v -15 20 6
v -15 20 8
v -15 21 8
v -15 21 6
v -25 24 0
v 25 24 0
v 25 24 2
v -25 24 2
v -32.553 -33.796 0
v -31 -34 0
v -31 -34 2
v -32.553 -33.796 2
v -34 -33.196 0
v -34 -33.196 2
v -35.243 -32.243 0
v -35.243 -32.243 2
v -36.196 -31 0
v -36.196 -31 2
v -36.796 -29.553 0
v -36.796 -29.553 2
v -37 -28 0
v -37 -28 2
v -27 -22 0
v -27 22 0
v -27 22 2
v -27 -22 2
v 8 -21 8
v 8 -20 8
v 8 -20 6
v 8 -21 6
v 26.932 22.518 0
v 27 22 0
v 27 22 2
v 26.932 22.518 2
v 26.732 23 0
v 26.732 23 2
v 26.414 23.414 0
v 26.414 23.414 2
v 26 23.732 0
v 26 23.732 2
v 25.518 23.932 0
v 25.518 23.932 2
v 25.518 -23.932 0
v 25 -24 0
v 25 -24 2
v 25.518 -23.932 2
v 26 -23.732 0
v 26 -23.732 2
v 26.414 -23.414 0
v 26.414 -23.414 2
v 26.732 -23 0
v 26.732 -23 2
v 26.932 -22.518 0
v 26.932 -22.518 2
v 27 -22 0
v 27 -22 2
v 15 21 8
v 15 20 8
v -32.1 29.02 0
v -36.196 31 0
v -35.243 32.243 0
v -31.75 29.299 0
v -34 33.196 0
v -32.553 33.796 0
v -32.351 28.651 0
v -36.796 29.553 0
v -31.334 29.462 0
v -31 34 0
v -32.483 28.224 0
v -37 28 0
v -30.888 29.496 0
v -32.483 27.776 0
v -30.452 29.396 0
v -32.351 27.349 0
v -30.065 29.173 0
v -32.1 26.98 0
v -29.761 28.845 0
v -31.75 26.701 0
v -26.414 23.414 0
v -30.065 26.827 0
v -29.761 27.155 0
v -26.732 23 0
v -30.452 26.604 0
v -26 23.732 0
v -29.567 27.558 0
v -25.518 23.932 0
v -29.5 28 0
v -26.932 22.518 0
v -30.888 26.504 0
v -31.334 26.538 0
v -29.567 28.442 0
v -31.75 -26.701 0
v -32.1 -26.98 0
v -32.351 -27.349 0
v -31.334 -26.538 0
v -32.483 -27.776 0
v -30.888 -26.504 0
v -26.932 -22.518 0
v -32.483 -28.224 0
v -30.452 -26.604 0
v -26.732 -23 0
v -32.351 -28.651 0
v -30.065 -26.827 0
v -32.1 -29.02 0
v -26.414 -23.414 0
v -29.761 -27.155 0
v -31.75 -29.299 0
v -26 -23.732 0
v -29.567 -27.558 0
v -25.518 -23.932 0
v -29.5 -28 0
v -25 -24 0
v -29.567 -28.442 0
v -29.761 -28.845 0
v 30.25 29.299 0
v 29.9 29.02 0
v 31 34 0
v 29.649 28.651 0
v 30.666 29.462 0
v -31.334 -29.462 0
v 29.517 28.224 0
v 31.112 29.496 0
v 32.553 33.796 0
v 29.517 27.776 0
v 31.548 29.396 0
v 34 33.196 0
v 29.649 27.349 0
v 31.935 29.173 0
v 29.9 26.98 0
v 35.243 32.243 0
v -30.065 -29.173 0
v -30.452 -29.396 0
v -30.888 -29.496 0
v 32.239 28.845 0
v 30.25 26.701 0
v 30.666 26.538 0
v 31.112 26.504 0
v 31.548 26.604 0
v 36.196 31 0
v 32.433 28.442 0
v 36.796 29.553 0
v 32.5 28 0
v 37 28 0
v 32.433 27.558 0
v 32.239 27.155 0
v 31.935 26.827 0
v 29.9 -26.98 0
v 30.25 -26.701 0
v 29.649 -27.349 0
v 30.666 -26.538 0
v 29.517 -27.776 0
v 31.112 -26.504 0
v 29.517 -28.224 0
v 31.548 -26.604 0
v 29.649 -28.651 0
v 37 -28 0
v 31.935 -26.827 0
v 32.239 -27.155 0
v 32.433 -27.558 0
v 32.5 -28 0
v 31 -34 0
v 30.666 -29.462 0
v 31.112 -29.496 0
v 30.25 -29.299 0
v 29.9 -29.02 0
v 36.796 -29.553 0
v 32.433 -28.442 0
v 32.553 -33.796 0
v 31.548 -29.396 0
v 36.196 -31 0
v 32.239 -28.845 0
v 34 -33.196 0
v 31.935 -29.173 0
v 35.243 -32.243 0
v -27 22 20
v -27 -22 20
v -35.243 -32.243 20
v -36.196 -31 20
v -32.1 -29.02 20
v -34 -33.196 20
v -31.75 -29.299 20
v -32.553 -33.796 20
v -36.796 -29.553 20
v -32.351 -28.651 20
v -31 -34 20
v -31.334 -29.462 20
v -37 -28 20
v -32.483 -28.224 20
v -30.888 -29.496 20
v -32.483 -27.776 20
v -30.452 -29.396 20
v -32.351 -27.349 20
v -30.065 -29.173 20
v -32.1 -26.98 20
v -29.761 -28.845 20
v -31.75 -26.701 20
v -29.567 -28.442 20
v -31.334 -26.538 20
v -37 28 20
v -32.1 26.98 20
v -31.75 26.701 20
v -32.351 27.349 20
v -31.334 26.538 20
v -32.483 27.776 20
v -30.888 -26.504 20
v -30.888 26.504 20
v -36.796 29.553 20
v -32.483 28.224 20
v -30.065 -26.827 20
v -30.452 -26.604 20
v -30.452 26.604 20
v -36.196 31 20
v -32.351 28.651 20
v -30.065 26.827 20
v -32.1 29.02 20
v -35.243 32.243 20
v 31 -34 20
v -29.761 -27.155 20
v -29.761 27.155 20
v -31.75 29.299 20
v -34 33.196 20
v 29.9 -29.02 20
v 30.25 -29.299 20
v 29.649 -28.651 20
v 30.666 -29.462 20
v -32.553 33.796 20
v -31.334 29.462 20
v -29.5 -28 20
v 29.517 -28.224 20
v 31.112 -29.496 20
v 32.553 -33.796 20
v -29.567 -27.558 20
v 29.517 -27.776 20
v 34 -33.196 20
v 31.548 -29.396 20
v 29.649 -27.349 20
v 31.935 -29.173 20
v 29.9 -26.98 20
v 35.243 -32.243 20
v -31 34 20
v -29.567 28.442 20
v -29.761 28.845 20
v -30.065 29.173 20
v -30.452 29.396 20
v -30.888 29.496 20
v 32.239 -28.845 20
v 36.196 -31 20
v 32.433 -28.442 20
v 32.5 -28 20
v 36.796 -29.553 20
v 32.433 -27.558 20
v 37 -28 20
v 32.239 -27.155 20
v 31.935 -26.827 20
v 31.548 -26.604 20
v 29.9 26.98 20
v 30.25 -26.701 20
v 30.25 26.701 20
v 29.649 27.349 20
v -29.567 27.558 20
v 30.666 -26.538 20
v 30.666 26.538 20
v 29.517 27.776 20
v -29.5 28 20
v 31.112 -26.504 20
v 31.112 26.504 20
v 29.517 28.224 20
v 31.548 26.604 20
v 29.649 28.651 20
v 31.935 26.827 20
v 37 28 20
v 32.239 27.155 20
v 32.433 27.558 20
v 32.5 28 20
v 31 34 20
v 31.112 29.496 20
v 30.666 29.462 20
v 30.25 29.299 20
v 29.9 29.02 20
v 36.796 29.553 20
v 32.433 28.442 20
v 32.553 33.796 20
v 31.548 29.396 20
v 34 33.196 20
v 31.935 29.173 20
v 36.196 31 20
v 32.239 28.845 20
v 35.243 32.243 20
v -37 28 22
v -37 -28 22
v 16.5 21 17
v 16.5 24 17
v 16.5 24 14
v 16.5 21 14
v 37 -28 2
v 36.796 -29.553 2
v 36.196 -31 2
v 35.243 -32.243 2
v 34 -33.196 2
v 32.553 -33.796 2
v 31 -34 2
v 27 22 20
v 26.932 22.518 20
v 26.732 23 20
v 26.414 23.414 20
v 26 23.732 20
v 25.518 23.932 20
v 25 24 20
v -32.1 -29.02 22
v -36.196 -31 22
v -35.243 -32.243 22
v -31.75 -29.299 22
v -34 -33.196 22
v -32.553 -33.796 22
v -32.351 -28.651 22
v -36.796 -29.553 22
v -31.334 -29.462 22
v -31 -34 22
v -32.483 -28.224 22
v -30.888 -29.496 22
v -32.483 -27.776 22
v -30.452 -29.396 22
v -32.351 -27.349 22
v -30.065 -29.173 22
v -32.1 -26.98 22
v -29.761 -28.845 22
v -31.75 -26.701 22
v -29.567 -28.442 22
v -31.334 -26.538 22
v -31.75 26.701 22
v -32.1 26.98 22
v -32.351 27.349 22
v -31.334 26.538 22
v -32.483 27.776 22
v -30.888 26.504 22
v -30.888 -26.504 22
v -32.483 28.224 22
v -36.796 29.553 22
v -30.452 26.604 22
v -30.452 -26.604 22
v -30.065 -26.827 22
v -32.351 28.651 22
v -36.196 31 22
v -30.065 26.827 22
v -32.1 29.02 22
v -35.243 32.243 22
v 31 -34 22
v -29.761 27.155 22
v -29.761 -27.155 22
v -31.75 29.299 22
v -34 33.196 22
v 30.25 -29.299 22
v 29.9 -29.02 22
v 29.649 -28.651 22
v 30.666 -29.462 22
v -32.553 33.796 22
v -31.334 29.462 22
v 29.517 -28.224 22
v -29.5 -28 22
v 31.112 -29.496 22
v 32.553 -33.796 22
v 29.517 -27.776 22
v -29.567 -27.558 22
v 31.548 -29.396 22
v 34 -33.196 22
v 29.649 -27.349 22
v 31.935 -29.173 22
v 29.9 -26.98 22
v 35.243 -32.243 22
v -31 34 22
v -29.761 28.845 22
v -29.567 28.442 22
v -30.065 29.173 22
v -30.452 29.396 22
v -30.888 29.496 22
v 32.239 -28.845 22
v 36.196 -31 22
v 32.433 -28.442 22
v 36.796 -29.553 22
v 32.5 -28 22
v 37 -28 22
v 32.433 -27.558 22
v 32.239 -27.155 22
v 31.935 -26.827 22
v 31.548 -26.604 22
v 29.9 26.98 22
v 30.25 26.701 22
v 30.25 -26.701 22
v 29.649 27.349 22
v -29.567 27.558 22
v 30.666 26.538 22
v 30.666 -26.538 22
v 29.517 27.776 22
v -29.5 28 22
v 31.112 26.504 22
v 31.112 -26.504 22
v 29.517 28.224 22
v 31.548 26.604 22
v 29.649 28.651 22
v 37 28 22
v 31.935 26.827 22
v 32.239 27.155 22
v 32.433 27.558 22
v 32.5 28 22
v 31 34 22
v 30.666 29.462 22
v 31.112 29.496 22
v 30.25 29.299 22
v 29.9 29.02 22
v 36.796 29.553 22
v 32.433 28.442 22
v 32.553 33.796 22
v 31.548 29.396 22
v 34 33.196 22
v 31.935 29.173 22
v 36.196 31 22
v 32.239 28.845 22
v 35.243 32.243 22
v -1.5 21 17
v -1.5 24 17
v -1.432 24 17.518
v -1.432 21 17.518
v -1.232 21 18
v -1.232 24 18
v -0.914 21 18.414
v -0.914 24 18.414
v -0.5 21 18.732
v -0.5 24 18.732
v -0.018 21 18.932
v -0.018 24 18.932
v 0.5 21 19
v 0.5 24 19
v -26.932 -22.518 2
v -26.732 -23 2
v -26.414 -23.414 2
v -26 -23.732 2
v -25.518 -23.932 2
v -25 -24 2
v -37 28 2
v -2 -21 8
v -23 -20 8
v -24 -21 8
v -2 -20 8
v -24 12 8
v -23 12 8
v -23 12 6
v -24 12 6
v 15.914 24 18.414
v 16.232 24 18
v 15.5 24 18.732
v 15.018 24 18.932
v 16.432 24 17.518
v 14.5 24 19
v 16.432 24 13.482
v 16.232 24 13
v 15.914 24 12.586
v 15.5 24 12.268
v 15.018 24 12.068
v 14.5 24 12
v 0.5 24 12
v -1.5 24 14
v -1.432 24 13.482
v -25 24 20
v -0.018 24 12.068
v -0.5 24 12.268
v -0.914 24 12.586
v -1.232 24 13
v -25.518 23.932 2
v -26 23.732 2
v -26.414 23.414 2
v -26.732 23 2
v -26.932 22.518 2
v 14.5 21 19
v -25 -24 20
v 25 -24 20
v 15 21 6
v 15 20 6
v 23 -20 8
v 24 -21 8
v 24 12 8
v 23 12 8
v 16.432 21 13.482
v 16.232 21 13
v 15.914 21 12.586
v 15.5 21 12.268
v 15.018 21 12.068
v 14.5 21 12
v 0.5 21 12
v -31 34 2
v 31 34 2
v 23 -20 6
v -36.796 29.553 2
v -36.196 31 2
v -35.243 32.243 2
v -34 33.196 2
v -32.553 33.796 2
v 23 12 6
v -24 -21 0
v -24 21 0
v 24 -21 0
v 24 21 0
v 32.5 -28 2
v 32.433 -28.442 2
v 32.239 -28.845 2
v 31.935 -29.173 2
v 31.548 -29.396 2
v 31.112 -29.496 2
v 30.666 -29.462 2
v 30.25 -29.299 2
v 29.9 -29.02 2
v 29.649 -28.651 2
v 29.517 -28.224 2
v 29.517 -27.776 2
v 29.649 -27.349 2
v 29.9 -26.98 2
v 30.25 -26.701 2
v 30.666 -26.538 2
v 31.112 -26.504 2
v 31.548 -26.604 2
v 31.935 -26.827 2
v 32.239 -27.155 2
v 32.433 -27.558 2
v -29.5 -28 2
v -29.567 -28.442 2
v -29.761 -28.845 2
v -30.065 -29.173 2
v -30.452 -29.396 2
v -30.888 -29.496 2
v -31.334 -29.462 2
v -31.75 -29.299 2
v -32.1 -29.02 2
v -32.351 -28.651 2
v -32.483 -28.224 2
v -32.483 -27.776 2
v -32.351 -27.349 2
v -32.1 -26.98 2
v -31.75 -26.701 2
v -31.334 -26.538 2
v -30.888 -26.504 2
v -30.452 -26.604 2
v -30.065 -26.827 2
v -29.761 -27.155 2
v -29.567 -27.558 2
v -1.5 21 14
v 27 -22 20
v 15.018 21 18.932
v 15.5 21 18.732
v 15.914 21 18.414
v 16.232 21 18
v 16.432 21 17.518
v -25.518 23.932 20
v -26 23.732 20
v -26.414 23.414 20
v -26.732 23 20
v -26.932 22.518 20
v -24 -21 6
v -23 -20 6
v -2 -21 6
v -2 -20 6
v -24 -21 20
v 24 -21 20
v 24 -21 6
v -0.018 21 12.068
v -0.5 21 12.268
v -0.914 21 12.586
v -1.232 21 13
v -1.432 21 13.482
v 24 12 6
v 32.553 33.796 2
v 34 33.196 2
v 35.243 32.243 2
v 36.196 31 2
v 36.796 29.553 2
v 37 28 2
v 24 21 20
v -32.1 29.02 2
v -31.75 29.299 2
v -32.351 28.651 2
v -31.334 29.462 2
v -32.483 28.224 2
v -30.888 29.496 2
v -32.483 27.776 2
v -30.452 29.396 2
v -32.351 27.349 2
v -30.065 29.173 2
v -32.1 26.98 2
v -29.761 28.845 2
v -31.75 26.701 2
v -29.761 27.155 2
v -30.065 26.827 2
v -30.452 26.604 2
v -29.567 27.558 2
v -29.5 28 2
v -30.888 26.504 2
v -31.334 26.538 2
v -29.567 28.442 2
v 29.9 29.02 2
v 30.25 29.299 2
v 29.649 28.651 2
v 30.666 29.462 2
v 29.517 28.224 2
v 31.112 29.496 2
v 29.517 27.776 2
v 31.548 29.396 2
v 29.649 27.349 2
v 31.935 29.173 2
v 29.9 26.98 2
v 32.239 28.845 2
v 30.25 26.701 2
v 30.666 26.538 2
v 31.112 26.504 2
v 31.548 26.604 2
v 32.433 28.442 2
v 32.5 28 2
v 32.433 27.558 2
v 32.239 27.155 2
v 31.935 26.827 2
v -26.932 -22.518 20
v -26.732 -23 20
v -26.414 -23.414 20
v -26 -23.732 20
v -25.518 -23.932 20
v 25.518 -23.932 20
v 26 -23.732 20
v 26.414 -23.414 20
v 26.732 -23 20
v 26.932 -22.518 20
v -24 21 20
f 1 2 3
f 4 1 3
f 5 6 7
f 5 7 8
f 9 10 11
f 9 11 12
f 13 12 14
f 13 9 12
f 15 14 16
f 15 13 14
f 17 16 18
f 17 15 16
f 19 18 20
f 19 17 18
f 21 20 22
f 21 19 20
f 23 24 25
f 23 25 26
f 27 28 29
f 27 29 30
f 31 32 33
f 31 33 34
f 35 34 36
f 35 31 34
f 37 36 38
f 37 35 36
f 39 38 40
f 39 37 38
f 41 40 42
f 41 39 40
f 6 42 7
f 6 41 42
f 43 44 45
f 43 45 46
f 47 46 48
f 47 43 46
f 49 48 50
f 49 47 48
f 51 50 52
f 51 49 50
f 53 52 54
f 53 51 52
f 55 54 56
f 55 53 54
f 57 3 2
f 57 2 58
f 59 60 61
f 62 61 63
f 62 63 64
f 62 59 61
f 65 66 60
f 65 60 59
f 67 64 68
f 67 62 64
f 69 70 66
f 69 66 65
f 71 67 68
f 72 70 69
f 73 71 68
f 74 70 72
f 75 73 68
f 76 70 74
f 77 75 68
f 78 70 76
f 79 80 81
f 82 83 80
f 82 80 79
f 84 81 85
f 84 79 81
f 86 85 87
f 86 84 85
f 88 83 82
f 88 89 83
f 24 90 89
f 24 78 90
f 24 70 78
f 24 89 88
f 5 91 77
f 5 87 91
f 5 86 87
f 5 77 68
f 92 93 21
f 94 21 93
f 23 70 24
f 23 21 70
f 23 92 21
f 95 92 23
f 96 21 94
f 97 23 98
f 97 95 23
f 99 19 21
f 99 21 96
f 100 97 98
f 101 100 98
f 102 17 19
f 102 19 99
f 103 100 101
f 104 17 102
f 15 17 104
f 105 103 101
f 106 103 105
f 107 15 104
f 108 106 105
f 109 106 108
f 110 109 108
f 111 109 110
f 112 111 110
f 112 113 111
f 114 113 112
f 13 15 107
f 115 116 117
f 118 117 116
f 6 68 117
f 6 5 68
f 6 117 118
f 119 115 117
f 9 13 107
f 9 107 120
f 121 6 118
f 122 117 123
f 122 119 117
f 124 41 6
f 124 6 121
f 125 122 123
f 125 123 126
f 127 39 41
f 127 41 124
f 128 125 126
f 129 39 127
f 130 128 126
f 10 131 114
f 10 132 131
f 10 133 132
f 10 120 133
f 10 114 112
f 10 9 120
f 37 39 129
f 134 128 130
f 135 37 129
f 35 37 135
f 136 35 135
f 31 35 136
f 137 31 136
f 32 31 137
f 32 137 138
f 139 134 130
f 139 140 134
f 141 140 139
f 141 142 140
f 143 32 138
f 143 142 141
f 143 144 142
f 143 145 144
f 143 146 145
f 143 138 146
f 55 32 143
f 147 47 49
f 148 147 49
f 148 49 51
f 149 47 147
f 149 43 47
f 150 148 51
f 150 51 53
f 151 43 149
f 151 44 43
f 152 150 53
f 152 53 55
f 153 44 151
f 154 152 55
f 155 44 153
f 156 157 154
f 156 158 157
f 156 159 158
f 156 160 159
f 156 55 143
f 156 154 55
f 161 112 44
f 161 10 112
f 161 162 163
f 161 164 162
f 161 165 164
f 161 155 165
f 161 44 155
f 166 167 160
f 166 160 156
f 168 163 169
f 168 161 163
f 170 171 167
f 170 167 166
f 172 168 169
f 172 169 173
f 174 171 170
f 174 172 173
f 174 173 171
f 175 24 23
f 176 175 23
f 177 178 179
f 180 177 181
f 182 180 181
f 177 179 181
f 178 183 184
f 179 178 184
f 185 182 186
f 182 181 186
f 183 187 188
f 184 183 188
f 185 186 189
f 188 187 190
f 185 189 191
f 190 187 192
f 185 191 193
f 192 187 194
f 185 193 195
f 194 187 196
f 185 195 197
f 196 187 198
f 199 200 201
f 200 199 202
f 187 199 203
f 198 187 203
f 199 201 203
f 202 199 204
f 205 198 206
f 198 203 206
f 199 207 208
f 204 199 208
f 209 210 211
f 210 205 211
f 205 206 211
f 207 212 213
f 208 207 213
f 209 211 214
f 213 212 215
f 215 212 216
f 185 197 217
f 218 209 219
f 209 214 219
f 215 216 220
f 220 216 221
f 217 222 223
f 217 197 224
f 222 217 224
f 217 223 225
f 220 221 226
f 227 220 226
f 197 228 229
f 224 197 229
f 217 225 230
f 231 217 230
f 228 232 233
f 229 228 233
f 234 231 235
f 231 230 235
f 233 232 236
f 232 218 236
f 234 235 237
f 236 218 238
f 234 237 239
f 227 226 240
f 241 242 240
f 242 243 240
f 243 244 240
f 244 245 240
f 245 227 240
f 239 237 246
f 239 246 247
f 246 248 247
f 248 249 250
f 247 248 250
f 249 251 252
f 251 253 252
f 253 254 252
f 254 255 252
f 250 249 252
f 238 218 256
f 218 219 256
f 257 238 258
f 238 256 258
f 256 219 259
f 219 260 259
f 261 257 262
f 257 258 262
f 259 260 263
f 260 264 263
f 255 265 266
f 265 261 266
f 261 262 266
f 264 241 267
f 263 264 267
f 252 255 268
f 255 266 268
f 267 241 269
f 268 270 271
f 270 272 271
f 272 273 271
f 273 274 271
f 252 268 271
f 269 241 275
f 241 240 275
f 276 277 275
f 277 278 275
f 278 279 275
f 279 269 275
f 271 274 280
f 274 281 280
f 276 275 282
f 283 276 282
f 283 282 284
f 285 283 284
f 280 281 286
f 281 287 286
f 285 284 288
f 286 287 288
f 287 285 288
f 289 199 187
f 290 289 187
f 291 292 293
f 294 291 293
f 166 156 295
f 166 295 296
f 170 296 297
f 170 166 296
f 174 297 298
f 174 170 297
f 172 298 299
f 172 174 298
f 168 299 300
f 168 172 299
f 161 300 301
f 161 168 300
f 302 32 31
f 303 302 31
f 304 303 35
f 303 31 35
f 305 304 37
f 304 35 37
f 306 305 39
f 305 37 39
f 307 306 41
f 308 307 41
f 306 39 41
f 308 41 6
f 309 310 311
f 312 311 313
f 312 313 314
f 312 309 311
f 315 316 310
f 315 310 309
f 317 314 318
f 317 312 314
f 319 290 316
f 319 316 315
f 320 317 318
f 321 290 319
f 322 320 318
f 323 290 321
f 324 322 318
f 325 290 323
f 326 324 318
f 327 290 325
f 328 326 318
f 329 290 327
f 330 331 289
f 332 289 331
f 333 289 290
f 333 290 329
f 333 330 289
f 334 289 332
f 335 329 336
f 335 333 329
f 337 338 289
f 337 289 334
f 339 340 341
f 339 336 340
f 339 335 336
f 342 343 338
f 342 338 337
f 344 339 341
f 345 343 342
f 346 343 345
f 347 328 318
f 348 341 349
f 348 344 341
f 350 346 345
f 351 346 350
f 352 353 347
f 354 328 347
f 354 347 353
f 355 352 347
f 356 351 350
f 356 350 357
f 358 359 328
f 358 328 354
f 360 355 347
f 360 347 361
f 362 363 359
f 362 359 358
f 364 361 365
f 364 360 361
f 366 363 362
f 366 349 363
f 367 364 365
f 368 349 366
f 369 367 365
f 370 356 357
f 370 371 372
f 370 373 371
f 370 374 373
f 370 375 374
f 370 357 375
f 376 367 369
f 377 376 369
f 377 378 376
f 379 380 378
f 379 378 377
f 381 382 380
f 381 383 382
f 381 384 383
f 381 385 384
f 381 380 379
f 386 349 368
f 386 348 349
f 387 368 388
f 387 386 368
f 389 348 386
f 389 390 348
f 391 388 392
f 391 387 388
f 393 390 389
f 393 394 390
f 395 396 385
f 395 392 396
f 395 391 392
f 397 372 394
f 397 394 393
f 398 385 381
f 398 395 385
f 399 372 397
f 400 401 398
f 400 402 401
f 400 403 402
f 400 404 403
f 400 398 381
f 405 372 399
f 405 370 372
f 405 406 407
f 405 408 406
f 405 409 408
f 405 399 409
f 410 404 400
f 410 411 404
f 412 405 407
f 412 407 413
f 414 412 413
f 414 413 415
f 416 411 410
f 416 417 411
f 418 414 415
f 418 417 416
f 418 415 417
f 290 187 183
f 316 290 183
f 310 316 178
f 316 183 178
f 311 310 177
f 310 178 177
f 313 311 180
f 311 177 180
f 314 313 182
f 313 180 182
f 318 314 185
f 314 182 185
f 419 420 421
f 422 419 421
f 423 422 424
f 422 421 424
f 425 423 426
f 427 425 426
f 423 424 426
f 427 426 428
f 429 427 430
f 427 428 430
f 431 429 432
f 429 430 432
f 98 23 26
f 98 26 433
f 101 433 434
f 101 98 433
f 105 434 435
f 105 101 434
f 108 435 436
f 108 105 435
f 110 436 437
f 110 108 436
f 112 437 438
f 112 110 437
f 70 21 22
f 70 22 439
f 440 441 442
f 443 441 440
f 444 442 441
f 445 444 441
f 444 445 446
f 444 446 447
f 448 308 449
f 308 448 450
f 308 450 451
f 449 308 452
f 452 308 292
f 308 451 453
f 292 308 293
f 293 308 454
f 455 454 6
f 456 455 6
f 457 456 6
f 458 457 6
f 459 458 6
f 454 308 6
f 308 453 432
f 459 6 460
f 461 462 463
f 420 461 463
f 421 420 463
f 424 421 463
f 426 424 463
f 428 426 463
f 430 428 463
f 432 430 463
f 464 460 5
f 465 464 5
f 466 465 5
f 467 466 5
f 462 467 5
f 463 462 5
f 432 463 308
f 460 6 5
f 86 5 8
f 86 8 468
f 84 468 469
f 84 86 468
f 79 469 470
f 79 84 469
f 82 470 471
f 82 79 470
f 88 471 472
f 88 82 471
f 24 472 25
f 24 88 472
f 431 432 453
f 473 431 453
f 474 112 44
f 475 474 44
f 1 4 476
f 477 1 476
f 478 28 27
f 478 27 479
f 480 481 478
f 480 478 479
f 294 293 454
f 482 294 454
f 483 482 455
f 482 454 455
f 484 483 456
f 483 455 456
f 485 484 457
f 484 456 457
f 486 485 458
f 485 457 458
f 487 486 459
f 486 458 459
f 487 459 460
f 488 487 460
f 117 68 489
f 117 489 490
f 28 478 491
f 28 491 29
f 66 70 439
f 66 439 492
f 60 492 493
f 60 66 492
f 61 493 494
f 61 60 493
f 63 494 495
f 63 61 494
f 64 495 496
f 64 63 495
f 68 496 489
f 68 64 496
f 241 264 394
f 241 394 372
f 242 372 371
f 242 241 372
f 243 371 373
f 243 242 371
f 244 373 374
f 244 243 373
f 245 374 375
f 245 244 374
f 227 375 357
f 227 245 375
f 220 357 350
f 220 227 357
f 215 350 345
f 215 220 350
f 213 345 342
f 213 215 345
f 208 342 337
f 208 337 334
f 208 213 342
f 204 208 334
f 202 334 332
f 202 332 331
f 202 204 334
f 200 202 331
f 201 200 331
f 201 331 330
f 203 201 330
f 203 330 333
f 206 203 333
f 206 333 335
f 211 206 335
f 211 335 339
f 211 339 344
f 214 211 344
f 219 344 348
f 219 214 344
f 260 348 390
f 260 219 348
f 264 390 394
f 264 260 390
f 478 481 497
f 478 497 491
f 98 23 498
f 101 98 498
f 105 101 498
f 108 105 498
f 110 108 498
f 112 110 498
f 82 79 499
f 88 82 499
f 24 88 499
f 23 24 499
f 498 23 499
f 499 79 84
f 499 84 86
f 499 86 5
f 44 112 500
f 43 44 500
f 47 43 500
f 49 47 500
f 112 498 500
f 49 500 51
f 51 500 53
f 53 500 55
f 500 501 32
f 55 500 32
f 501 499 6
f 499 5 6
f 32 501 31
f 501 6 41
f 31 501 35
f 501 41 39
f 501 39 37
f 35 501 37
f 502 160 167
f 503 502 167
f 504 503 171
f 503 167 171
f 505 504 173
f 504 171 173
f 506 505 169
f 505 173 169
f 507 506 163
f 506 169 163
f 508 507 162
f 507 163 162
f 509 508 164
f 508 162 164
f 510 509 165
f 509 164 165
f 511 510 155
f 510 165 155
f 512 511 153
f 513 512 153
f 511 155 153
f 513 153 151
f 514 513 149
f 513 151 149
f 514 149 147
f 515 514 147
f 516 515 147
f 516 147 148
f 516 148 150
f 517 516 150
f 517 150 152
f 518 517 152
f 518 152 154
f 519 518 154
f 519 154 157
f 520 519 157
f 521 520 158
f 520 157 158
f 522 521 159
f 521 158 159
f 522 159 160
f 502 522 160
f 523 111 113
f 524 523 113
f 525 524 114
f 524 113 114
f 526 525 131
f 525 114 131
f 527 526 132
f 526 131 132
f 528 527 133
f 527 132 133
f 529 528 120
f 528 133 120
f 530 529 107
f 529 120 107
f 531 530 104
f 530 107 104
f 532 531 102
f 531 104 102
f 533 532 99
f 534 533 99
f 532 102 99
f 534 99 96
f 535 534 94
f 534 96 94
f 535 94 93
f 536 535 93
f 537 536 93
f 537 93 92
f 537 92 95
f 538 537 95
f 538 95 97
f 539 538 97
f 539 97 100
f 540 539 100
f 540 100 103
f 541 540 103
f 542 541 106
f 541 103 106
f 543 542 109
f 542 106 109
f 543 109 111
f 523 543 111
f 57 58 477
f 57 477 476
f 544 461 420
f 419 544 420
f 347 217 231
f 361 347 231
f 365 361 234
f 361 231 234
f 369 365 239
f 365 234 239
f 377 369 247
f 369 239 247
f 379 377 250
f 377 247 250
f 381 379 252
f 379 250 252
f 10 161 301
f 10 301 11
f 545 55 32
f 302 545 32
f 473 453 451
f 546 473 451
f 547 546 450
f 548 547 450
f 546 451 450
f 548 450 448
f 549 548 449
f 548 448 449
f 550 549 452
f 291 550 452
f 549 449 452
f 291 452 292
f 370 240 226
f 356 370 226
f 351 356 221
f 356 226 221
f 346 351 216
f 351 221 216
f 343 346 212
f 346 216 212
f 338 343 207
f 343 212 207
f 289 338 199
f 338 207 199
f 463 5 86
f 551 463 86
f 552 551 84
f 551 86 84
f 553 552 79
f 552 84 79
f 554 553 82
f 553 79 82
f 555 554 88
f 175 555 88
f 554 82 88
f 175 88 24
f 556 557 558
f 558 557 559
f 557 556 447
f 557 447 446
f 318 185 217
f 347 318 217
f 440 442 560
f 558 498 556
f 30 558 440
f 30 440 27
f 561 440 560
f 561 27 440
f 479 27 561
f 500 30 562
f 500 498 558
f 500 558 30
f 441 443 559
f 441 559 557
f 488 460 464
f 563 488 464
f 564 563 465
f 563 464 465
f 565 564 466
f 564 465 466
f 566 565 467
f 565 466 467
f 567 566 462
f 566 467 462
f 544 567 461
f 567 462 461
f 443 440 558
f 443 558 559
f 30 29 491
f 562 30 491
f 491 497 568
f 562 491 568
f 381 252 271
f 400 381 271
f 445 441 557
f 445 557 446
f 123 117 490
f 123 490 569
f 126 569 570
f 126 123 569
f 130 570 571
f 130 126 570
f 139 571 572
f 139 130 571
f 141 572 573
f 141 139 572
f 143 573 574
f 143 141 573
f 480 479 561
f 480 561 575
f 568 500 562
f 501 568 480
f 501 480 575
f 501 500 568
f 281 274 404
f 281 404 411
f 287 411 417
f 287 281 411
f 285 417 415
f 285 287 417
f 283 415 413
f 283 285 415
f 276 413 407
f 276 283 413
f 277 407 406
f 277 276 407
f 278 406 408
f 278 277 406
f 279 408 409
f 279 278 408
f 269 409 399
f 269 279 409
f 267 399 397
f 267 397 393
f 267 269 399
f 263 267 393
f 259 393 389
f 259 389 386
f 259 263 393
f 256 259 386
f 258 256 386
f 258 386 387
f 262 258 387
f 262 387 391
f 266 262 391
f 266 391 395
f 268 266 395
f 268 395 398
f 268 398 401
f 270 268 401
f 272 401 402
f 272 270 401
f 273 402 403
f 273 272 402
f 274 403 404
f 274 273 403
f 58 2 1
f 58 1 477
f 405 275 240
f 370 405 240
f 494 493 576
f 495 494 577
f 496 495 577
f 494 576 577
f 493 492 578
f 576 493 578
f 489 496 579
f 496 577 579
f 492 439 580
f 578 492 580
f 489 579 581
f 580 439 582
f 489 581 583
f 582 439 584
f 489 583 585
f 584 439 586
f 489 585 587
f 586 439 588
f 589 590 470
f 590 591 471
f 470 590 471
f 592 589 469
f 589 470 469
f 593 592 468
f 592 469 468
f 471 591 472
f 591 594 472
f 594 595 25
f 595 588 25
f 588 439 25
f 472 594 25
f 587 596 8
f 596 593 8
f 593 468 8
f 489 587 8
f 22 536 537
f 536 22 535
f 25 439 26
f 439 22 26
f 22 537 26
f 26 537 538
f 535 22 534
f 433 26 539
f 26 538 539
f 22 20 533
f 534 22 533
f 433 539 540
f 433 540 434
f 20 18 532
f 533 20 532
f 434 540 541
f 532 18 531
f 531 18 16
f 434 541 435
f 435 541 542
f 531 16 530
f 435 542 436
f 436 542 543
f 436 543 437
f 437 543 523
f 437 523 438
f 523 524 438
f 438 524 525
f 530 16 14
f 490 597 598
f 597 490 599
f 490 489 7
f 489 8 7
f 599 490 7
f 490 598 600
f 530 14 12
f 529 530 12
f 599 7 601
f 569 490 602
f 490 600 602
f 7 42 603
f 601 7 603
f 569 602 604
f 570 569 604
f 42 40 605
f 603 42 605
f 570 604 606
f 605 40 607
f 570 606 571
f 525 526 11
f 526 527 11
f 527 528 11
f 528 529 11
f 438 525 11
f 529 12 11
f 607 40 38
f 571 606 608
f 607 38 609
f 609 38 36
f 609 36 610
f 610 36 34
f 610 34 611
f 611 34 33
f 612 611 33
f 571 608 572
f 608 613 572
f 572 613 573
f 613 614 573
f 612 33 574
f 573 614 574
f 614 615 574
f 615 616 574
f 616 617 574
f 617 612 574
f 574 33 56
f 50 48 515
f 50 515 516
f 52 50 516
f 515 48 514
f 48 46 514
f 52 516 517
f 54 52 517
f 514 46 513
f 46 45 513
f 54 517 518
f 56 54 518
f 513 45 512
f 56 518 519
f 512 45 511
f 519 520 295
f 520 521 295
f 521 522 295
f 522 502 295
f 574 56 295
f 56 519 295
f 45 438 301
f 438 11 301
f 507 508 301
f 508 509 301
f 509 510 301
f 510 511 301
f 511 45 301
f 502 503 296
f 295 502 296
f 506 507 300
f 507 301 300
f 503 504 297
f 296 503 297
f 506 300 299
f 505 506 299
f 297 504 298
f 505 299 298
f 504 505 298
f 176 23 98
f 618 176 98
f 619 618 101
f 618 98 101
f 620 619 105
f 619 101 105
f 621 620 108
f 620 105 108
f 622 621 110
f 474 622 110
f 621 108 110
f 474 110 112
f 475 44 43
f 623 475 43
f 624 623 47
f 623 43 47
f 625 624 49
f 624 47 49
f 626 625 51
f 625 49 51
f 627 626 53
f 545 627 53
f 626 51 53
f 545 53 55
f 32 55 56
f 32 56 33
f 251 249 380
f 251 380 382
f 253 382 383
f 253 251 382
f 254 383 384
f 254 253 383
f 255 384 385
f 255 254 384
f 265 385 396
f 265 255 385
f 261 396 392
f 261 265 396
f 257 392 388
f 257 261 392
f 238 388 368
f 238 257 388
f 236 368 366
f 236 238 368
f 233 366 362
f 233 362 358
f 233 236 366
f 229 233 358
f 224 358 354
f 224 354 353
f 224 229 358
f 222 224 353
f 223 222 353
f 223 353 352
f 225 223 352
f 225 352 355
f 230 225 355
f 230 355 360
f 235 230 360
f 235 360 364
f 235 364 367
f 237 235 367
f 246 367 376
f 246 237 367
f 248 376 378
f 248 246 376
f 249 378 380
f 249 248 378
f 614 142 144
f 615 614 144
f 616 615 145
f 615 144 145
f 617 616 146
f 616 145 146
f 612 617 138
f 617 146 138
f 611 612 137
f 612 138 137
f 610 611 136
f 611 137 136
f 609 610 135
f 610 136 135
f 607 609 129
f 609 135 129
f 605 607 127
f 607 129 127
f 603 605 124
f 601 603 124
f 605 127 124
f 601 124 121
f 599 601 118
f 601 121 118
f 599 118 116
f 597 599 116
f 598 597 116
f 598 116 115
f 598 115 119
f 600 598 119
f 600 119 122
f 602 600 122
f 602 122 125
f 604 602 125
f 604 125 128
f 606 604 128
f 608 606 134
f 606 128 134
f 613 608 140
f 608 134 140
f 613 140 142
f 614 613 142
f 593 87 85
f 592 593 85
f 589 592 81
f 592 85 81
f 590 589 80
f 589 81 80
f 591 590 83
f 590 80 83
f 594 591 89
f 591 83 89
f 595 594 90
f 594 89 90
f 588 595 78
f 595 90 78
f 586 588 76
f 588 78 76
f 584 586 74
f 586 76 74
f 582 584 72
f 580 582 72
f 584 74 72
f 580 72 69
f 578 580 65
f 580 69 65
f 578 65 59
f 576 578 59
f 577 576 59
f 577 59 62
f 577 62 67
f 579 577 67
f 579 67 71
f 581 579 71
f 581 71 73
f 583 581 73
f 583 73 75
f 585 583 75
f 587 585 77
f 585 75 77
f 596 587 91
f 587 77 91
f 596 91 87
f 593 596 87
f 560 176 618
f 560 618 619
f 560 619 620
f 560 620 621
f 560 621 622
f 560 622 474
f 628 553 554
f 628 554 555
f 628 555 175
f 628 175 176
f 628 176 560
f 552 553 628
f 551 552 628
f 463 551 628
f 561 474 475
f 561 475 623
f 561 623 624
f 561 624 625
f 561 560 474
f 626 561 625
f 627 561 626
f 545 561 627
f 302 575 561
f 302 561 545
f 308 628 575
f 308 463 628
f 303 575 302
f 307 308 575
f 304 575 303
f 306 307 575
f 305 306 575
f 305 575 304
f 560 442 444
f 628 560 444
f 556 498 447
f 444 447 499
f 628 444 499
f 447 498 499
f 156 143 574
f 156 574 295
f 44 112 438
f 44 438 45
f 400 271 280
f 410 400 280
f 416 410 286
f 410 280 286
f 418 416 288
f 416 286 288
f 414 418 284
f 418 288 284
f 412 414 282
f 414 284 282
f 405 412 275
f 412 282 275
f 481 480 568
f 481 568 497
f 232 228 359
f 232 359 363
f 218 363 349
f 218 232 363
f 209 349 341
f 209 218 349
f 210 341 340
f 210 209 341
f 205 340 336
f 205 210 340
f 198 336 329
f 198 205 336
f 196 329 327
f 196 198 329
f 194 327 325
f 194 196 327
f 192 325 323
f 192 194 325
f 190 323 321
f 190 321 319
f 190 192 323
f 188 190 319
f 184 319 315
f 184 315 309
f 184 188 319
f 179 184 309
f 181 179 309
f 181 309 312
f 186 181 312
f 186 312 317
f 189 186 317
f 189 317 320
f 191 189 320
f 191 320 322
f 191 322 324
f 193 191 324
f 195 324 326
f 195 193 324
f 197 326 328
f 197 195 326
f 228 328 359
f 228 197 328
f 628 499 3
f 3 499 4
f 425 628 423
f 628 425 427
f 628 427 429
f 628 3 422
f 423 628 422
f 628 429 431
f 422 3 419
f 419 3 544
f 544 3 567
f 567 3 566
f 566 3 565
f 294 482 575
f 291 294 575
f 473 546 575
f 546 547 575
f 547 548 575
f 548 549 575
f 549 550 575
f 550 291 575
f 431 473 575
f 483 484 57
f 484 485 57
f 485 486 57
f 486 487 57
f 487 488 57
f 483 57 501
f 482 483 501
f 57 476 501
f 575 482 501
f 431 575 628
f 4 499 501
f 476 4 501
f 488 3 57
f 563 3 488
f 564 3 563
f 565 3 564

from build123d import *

# Parameters (mm, degrees)
F0_W      = 48
F0_H      = 42
F1_DEPTH  = 20
F3_DEPTH  = 25
F5_W      = 30
F5_H      = 1
F6_DEPTH  = 2
F7_R      = 1.5
F8_DEPTH  = 2
F9_R      = 1.5
F10_DEPTH = 2


with BuildPart() as f1:
    # F0 (on Top) → F1 (new body)
    with BuildSketch(Plane.XY):
        with BuildLine():
            ThreePointArc((-25, 24), (-26.414214, 23.414214), (-27, 22))
            Line((-27, 22), (-27, -22))
            ThreePointArc((-27, -22), (-26.414214, -23.414214), (-25, -24))
            Line((-25, -24), (25, -24))
            ThreePointArc((25, -24), (26.414214, -23.414214), (27, -22))
            Line((27, -22), (27, 22))
            ThreePointArc((27, 22), (26.414214, 23.414214), (25, 24))
            Line((25, 24), (-25, 24))
        make_face()
        Rectangle(F0_W, F0_H, mode=Mode.SUBTRACT)
    extrude(amount=F1_DEPTH)

    # F2 (on face) → F3 (cut)
    with BuildSketch(Plane(origin=(0, 24, 0), x_dir=(-1, 0, 0), z_dir=(0, 1, 0))):
        with BuildLine():
            ThreePointArc((-16.5, 14), (-15.914214, 12.585786), (-14.5, 12))
            Line((-14.5, 12), (-0.5, 12))
            ThreePointArc((-0.5, 12), (0.914214, 12.585786), (1.5, 14))
            Line((1.5, 14), (1.5, 17))
            ThreePointArc((1.5, 17), (0.914214, 18.414214), (-0.5, 19))
            Line((-0.5, 19), (-14.5, 19))
            ThreePointArc((-14.5, 19), (-15.914214, 18.414214), (-16.5, 17))
            Line((-16.5, 17), (-16.5, 14))
        make_face()
    extrude(amount=-F3_DEPTH, mode=Mode.SUBTRACT)

    # F5 (on offset) → F6 (join)
    with BuildSketch(Plane.XY.offset(8)):
        Polygon((24, -21), (24, 12), (23, 12), (23, -20), (8, -20), (8, -21), align=None)
        with Locations((0, 20.5)):
            Rectangle(F5_W, F5_H)
        Polygon((-23, 12), (-24, 12), (-24, -21), (-2, -21), (-2, -20), (-23, -20), align=None)
    extrude(amount=-F6_DEPTH)


with BuildPart() as f8:
    # F7 (on face) → F8 (new body)
    with BuildSketch(Plane.XY.offset(20)):
        with BuildLine():
            ThreePointArc((37, 28), (35.242641, 32.242641), (31, 34))
            Line((31, 34), (-31, 34))
            ThreePointArc((-31, 34), (-35.242641, 32.242641), (-37, 28))
            Line((-37, 28), (-37, -28))
            ThreePointArc((-37, -28), (-35.242641, -32.242641), (-31, -34))
            Line((-31, -34), (31, -34))
            ThreePointArc((31, -34), (35.242641, -32.242641), (37, -28))
            Line((37, -28), (37, 28))
        make_face()
        with Locations((-31, -28)):
            Circle(F7_R, mode=Mode.SUBTRACT)
        with Locations((31, -28)):
            Circle(F7_R, mode=Mode.SUBTRACT)
        with Locations((-31, 28)):
            Circle(F7_R, mode=Mode.SUBTRACT)
        with Locations((31, 28)):
            Circle(F7_R, mode=Mode.SUBTRACT)
    extrude(amount=F8_DEPTH)


with BuildPart() as f10:
    # F9 (on face) → F10 (new body)
    with BuildSketch(Plane(origin=(0, 0, 0), x_dir=(1, 0, 0), z_dir=(0, 0, -1))):
        with BuildLine():
            Line((-31, -34), (31, -34))
            ThreePointArc((31, -34), (35.242641, -32.242641), (37, -28))
            Line((37, -28), (37, 28))
            ThreePointArc((37, 28), (35.242641, 32.242641), (31, 34))
            Line((31, 34), (-31, 34))
            ThreePointArc((-31, 34), (-35.242641, 32.242641), (-37, 28))
            Line((-37, 28), (-37, -28))
            ThreePointArc((-37, -28), (-35.242641, -32.242641), (-31, -34))
        make_face()
        with Locations((-31, -28)):
            Circle(F9_R, mode=Mode.SUBTRACT)
        with Locations((31, -28)):
            Circle(F9_R, mode=Mode.SUBTRACT)
        with Locations((-31, 28)):
            Circle(F9_R, mode=Mode.SUBTRACT)
        with BuildLine():
            Line((27, 22), (27, -22))
            ThreePointArc((27, -22), (26.414214, -23.414214), (25, -24))
            Line((25, -24), (-25, -24))
            ThreePointArc((-25, -24), (-26.414214, -23.414214), (-27, -22))
            Line((-27, -22), (-27, 22))
            ThreePointArc((-27, 22), (-26.414214, 23.414214), (-25, 24))
            Line((-25, 24), (25, 24))
            ThreePointArc((25, 24), (26.414214, 23.414214), (27, 22))
        make_face(mode=Mode.SUBTRACT)
        with Locations((31, 28)):
            Circle(F9_R, mode=Mode.SUBTRACT)
    extrude(amount=-F10_DEPTH)


solid = Compound([f1.part, f8.part, f10.part])
